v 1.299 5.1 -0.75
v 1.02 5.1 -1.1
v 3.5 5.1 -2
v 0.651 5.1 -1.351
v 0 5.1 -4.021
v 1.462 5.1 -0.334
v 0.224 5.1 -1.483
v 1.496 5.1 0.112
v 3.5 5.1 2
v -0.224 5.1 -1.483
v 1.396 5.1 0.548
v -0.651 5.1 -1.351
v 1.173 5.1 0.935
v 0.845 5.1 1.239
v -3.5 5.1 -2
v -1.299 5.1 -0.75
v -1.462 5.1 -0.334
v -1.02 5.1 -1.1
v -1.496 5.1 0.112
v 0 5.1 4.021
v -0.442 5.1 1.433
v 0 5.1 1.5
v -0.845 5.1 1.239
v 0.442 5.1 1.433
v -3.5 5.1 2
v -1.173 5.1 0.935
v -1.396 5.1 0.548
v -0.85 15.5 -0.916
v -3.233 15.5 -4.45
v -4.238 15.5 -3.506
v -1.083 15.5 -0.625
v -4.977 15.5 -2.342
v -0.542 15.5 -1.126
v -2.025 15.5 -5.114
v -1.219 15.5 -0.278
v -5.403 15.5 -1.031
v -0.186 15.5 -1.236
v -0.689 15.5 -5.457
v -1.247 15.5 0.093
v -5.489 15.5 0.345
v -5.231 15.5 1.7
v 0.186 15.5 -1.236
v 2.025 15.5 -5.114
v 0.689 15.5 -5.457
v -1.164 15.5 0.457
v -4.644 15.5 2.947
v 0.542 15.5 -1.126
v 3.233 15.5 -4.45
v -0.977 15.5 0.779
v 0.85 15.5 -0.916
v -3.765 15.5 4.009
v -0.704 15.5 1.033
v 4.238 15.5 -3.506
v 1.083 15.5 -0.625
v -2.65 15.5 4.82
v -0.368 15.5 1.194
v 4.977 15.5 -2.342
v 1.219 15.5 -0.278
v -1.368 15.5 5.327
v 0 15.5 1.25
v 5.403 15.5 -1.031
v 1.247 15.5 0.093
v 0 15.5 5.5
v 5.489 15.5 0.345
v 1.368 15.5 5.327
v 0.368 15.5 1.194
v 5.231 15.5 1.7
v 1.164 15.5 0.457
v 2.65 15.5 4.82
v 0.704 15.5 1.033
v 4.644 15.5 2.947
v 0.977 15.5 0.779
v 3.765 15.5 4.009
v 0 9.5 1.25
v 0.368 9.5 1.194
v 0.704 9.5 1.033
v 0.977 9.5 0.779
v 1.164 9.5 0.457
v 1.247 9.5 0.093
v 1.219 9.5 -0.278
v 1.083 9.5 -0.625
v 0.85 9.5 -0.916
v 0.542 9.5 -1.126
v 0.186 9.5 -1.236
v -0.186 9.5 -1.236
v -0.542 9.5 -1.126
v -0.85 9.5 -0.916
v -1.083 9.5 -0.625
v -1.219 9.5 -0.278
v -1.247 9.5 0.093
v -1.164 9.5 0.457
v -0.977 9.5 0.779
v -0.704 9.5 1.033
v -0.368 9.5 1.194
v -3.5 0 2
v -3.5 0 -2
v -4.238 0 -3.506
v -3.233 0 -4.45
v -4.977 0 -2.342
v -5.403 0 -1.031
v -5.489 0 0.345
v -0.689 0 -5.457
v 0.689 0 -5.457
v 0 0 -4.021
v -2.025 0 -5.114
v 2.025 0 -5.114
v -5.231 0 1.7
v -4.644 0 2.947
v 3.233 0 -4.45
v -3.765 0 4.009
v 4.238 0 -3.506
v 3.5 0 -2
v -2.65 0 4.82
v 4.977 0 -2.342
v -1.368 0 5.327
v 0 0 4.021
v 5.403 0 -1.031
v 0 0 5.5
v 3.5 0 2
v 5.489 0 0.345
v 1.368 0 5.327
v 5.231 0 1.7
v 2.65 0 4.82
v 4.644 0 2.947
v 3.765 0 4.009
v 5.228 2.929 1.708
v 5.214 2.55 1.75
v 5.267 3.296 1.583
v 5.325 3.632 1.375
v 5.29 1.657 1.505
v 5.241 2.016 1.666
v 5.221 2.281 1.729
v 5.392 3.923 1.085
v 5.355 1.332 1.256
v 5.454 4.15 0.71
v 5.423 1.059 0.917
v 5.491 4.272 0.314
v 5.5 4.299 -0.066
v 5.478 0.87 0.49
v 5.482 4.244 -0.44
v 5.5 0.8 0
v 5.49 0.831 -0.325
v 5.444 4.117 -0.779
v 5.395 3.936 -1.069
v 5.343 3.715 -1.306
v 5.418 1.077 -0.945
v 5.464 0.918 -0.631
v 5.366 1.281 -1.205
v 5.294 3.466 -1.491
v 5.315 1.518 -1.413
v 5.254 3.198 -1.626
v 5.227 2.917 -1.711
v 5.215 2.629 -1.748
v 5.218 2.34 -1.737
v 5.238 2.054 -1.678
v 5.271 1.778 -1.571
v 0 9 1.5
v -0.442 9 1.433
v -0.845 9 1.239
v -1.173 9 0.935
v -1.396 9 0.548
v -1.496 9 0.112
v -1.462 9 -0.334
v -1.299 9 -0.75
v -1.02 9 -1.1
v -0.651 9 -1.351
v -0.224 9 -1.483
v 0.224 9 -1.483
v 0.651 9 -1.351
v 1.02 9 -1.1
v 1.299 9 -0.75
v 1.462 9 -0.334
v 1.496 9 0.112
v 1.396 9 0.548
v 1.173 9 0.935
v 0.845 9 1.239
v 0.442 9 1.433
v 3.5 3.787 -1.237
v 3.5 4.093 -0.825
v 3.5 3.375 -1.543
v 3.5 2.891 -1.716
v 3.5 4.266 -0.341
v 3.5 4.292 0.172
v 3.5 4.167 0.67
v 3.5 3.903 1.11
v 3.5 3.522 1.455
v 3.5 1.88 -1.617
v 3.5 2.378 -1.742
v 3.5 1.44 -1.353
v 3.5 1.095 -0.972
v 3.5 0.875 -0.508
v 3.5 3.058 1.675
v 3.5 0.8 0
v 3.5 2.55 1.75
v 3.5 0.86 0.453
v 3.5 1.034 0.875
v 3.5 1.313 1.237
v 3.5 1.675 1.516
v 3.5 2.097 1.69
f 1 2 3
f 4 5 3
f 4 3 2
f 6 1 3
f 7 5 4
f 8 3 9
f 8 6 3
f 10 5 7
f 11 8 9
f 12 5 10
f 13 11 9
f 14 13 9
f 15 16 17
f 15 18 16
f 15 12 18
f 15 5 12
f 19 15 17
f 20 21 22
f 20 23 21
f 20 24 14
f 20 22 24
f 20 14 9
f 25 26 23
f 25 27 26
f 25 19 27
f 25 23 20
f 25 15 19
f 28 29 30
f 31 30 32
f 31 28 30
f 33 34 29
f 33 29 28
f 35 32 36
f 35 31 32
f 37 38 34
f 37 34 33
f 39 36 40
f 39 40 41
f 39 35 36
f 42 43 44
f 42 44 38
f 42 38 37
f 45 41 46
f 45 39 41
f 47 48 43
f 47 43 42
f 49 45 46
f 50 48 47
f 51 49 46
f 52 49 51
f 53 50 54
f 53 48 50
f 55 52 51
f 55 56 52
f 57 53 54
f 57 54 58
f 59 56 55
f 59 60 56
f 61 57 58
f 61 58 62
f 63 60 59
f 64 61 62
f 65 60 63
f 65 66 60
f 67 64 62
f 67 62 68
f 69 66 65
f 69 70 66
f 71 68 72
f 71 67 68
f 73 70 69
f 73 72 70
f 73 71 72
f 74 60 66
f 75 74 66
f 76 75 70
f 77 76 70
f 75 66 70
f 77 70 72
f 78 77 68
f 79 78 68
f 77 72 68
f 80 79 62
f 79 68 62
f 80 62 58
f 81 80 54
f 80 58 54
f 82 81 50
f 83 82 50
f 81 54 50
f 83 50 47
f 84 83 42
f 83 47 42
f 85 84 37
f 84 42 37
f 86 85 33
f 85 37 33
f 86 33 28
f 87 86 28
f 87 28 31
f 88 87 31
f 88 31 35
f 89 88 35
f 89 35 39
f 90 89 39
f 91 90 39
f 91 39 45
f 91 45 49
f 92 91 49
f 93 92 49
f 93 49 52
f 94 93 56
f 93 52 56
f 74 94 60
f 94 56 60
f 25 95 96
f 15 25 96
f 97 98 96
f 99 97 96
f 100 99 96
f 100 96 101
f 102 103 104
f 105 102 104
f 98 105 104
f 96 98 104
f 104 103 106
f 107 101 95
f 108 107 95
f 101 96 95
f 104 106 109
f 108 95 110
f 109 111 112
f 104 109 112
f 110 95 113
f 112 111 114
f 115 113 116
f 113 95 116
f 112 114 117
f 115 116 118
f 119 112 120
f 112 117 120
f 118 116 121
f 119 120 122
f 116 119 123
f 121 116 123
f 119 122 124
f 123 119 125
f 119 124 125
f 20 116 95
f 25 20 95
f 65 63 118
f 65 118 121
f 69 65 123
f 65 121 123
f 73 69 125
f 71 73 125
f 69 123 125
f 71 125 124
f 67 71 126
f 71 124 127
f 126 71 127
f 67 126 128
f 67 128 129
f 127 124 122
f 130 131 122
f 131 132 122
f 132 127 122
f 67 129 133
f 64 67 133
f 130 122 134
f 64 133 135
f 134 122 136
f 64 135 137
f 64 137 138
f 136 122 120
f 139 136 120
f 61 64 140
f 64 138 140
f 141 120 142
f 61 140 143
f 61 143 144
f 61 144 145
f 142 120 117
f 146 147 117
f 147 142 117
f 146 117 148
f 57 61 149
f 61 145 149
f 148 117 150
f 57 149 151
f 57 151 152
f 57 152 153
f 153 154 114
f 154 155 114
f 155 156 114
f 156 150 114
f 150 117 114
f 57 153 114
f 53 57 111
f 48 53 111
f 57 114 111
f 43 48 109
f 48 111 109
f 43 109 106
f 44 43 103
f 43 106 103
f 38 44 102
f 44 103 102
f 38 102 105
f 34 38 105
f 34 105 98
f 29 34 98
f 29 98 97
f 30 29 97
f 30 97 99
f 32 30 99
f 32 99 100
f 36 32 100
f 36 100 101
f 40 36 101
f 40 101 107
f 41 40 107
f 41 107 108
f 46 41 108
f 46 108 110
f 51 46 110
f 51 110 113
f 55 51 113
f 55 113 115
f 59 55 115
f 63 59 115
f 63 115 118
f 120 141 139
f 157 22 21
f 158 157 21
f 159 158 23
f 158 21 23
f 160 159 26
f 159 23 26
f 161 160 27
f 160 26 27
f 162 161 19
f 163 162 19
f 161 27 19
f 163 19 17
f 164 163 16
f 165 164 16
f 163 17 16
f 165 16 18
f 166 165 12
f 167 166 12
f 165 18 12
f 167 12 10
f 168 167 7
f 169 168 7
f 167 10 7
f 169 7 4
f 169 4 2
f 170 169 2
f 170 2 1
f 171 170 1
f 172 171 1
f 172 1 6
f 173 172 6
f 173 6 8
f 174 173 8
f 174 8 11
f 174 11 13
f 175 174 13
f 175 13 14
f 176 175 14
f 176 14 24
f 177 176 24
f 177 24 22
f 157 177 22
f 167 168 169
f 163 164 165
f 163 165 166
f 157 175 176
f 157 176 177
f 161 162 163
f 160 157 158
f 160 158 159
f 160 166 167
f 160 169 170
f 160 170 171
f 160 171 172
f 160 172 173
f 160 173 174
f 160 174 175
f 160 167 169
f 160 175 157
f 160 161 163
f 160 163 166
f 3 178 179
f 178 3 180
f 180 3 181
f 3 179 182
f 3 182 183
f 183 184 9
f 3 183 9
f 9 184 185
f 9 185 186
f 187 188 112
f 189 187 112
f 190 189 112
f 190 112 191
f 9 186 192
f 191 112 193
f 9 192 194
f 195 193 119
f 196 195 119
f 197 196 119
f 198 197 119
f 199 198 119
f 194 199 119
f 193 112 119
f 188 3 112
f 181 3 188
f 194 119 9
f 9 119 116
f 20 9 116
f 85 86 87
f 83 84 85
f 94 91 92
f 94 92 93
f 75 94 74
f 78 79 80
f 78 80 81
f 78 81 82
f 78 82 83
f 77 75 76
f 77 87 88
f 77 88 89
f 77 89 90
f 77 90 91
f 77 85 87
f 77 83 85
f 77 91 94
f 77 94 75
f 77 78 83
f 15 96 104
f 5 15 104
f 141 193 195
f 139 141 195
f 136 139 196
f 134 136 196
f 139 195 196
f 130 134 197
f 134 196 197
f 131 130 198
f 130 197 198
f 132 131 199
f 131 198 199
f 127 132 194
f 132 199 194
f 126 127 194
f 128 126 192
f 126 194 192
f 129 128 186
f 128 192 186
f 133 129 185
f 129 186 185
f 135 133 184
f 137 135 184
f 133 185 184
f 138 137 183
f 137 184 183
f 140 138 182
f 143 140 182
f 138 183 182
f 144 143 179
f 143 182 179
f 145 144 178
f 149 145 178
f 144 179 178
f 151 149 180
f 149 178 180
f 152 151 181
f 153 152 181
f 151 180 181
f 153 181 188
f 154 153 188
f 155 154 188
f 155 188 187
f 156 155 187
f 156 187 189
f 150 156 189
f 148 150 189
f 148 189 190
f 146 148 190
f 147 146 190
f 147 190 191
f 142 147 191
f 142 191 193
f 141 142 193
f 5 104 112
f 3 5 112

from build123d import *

# Parameters (mm, degrees)
F0_R      = 5.5
F1_DEPTH  = 15.5
F2_R      = 1.5
F3_DEPTH  = 9
F5_R      = 1.25
F6_DEPTH  = 6
F4_R      = 1.5
F7_DEPTH  = 5.1
F9_DEPTH  = 25.4
F11_ANGLE = 180
F13_ANGLE = -90
F15_ANGLE = 90


# Not quite as in the source:
# - a feature names something its author has since deleted; it is built from what else it names


with BuildPart() as f1:
    # F0 (on Top) → F1 (new body)
    with BuildSketch(Plane.XY):
        Circle(F0_R)
    extrude(amount=F1_DEPTH)

    # F2 (on face) → F3 (cut)
    with BuildSketch(Plane(origin=(0, 0, 0), x_dir=(1, 0, 0), z_dir=(0, 0, -1))):
        Circle(F2_R)
    extrude(amount=-F3_DEPTH, mode=Mode.SUBTRACT)

    # F5 (on face) → F6 (cut)
    with BuildSketch(Plane.XY.offset(15.5)):
        Circle(F5_R)
    extrude(amount=-F6_DEPTH, mode=Mode.SUBTRACT)

    # F4 (on face) → F7 (cut)
    with BuildSketch(Plane(origin=(0, 0, 0), x_dir=(1, 0, 0), z_dir=(0, 0, -1))):
        Polygon((2, 3.5), (-2, 3.5), (-4.0207259422, 0), (-2, -3.5), (2, -3.5), (4.0207259422, 0), align=None)
        Circle(F4_R, mode=Mode.SUBTRACT)
    extrude(amount=-F7_DEPTH, mode=Mode.SUBTRACT)

    # F8 (on face) → F9 (cut)
    with BuildSketch(Plane.XZ.offset(-3.5)):
        with BuildLine():
            ThreePointArc((1.75, 2.55), (-1.2374368671, 3.7874368671), (0, 0.8))
            ThreePointArc((0, 0.8), (1.2374368671, 1.3125631329), (1.75, 2.55))
        make_face()
    extrude(amount=-F9_DEPTH, mode=Mode.SUBTRACT)


with BuildPart() as f1_1:
    # F11: moved
    add(f1.part.rotate(Axis((9.4123384915, 0, 0), (1, 0, 0)), F11_ANGLE))


with BuildPart() as f1_2:
    # F13: moved
    add(f1_1.part.rotate(Axis((-2.3788576946, 0, 0), (-1, 0, 0)), F13_ANGLE))


with BuildPart() as f1_3:
    # F15: moved
    add(f1_2.part.rotate(Axis((0, 5.9970328584, 0), (0, -1, 0)), F15_ANGLE))


solid = f1_3.part
